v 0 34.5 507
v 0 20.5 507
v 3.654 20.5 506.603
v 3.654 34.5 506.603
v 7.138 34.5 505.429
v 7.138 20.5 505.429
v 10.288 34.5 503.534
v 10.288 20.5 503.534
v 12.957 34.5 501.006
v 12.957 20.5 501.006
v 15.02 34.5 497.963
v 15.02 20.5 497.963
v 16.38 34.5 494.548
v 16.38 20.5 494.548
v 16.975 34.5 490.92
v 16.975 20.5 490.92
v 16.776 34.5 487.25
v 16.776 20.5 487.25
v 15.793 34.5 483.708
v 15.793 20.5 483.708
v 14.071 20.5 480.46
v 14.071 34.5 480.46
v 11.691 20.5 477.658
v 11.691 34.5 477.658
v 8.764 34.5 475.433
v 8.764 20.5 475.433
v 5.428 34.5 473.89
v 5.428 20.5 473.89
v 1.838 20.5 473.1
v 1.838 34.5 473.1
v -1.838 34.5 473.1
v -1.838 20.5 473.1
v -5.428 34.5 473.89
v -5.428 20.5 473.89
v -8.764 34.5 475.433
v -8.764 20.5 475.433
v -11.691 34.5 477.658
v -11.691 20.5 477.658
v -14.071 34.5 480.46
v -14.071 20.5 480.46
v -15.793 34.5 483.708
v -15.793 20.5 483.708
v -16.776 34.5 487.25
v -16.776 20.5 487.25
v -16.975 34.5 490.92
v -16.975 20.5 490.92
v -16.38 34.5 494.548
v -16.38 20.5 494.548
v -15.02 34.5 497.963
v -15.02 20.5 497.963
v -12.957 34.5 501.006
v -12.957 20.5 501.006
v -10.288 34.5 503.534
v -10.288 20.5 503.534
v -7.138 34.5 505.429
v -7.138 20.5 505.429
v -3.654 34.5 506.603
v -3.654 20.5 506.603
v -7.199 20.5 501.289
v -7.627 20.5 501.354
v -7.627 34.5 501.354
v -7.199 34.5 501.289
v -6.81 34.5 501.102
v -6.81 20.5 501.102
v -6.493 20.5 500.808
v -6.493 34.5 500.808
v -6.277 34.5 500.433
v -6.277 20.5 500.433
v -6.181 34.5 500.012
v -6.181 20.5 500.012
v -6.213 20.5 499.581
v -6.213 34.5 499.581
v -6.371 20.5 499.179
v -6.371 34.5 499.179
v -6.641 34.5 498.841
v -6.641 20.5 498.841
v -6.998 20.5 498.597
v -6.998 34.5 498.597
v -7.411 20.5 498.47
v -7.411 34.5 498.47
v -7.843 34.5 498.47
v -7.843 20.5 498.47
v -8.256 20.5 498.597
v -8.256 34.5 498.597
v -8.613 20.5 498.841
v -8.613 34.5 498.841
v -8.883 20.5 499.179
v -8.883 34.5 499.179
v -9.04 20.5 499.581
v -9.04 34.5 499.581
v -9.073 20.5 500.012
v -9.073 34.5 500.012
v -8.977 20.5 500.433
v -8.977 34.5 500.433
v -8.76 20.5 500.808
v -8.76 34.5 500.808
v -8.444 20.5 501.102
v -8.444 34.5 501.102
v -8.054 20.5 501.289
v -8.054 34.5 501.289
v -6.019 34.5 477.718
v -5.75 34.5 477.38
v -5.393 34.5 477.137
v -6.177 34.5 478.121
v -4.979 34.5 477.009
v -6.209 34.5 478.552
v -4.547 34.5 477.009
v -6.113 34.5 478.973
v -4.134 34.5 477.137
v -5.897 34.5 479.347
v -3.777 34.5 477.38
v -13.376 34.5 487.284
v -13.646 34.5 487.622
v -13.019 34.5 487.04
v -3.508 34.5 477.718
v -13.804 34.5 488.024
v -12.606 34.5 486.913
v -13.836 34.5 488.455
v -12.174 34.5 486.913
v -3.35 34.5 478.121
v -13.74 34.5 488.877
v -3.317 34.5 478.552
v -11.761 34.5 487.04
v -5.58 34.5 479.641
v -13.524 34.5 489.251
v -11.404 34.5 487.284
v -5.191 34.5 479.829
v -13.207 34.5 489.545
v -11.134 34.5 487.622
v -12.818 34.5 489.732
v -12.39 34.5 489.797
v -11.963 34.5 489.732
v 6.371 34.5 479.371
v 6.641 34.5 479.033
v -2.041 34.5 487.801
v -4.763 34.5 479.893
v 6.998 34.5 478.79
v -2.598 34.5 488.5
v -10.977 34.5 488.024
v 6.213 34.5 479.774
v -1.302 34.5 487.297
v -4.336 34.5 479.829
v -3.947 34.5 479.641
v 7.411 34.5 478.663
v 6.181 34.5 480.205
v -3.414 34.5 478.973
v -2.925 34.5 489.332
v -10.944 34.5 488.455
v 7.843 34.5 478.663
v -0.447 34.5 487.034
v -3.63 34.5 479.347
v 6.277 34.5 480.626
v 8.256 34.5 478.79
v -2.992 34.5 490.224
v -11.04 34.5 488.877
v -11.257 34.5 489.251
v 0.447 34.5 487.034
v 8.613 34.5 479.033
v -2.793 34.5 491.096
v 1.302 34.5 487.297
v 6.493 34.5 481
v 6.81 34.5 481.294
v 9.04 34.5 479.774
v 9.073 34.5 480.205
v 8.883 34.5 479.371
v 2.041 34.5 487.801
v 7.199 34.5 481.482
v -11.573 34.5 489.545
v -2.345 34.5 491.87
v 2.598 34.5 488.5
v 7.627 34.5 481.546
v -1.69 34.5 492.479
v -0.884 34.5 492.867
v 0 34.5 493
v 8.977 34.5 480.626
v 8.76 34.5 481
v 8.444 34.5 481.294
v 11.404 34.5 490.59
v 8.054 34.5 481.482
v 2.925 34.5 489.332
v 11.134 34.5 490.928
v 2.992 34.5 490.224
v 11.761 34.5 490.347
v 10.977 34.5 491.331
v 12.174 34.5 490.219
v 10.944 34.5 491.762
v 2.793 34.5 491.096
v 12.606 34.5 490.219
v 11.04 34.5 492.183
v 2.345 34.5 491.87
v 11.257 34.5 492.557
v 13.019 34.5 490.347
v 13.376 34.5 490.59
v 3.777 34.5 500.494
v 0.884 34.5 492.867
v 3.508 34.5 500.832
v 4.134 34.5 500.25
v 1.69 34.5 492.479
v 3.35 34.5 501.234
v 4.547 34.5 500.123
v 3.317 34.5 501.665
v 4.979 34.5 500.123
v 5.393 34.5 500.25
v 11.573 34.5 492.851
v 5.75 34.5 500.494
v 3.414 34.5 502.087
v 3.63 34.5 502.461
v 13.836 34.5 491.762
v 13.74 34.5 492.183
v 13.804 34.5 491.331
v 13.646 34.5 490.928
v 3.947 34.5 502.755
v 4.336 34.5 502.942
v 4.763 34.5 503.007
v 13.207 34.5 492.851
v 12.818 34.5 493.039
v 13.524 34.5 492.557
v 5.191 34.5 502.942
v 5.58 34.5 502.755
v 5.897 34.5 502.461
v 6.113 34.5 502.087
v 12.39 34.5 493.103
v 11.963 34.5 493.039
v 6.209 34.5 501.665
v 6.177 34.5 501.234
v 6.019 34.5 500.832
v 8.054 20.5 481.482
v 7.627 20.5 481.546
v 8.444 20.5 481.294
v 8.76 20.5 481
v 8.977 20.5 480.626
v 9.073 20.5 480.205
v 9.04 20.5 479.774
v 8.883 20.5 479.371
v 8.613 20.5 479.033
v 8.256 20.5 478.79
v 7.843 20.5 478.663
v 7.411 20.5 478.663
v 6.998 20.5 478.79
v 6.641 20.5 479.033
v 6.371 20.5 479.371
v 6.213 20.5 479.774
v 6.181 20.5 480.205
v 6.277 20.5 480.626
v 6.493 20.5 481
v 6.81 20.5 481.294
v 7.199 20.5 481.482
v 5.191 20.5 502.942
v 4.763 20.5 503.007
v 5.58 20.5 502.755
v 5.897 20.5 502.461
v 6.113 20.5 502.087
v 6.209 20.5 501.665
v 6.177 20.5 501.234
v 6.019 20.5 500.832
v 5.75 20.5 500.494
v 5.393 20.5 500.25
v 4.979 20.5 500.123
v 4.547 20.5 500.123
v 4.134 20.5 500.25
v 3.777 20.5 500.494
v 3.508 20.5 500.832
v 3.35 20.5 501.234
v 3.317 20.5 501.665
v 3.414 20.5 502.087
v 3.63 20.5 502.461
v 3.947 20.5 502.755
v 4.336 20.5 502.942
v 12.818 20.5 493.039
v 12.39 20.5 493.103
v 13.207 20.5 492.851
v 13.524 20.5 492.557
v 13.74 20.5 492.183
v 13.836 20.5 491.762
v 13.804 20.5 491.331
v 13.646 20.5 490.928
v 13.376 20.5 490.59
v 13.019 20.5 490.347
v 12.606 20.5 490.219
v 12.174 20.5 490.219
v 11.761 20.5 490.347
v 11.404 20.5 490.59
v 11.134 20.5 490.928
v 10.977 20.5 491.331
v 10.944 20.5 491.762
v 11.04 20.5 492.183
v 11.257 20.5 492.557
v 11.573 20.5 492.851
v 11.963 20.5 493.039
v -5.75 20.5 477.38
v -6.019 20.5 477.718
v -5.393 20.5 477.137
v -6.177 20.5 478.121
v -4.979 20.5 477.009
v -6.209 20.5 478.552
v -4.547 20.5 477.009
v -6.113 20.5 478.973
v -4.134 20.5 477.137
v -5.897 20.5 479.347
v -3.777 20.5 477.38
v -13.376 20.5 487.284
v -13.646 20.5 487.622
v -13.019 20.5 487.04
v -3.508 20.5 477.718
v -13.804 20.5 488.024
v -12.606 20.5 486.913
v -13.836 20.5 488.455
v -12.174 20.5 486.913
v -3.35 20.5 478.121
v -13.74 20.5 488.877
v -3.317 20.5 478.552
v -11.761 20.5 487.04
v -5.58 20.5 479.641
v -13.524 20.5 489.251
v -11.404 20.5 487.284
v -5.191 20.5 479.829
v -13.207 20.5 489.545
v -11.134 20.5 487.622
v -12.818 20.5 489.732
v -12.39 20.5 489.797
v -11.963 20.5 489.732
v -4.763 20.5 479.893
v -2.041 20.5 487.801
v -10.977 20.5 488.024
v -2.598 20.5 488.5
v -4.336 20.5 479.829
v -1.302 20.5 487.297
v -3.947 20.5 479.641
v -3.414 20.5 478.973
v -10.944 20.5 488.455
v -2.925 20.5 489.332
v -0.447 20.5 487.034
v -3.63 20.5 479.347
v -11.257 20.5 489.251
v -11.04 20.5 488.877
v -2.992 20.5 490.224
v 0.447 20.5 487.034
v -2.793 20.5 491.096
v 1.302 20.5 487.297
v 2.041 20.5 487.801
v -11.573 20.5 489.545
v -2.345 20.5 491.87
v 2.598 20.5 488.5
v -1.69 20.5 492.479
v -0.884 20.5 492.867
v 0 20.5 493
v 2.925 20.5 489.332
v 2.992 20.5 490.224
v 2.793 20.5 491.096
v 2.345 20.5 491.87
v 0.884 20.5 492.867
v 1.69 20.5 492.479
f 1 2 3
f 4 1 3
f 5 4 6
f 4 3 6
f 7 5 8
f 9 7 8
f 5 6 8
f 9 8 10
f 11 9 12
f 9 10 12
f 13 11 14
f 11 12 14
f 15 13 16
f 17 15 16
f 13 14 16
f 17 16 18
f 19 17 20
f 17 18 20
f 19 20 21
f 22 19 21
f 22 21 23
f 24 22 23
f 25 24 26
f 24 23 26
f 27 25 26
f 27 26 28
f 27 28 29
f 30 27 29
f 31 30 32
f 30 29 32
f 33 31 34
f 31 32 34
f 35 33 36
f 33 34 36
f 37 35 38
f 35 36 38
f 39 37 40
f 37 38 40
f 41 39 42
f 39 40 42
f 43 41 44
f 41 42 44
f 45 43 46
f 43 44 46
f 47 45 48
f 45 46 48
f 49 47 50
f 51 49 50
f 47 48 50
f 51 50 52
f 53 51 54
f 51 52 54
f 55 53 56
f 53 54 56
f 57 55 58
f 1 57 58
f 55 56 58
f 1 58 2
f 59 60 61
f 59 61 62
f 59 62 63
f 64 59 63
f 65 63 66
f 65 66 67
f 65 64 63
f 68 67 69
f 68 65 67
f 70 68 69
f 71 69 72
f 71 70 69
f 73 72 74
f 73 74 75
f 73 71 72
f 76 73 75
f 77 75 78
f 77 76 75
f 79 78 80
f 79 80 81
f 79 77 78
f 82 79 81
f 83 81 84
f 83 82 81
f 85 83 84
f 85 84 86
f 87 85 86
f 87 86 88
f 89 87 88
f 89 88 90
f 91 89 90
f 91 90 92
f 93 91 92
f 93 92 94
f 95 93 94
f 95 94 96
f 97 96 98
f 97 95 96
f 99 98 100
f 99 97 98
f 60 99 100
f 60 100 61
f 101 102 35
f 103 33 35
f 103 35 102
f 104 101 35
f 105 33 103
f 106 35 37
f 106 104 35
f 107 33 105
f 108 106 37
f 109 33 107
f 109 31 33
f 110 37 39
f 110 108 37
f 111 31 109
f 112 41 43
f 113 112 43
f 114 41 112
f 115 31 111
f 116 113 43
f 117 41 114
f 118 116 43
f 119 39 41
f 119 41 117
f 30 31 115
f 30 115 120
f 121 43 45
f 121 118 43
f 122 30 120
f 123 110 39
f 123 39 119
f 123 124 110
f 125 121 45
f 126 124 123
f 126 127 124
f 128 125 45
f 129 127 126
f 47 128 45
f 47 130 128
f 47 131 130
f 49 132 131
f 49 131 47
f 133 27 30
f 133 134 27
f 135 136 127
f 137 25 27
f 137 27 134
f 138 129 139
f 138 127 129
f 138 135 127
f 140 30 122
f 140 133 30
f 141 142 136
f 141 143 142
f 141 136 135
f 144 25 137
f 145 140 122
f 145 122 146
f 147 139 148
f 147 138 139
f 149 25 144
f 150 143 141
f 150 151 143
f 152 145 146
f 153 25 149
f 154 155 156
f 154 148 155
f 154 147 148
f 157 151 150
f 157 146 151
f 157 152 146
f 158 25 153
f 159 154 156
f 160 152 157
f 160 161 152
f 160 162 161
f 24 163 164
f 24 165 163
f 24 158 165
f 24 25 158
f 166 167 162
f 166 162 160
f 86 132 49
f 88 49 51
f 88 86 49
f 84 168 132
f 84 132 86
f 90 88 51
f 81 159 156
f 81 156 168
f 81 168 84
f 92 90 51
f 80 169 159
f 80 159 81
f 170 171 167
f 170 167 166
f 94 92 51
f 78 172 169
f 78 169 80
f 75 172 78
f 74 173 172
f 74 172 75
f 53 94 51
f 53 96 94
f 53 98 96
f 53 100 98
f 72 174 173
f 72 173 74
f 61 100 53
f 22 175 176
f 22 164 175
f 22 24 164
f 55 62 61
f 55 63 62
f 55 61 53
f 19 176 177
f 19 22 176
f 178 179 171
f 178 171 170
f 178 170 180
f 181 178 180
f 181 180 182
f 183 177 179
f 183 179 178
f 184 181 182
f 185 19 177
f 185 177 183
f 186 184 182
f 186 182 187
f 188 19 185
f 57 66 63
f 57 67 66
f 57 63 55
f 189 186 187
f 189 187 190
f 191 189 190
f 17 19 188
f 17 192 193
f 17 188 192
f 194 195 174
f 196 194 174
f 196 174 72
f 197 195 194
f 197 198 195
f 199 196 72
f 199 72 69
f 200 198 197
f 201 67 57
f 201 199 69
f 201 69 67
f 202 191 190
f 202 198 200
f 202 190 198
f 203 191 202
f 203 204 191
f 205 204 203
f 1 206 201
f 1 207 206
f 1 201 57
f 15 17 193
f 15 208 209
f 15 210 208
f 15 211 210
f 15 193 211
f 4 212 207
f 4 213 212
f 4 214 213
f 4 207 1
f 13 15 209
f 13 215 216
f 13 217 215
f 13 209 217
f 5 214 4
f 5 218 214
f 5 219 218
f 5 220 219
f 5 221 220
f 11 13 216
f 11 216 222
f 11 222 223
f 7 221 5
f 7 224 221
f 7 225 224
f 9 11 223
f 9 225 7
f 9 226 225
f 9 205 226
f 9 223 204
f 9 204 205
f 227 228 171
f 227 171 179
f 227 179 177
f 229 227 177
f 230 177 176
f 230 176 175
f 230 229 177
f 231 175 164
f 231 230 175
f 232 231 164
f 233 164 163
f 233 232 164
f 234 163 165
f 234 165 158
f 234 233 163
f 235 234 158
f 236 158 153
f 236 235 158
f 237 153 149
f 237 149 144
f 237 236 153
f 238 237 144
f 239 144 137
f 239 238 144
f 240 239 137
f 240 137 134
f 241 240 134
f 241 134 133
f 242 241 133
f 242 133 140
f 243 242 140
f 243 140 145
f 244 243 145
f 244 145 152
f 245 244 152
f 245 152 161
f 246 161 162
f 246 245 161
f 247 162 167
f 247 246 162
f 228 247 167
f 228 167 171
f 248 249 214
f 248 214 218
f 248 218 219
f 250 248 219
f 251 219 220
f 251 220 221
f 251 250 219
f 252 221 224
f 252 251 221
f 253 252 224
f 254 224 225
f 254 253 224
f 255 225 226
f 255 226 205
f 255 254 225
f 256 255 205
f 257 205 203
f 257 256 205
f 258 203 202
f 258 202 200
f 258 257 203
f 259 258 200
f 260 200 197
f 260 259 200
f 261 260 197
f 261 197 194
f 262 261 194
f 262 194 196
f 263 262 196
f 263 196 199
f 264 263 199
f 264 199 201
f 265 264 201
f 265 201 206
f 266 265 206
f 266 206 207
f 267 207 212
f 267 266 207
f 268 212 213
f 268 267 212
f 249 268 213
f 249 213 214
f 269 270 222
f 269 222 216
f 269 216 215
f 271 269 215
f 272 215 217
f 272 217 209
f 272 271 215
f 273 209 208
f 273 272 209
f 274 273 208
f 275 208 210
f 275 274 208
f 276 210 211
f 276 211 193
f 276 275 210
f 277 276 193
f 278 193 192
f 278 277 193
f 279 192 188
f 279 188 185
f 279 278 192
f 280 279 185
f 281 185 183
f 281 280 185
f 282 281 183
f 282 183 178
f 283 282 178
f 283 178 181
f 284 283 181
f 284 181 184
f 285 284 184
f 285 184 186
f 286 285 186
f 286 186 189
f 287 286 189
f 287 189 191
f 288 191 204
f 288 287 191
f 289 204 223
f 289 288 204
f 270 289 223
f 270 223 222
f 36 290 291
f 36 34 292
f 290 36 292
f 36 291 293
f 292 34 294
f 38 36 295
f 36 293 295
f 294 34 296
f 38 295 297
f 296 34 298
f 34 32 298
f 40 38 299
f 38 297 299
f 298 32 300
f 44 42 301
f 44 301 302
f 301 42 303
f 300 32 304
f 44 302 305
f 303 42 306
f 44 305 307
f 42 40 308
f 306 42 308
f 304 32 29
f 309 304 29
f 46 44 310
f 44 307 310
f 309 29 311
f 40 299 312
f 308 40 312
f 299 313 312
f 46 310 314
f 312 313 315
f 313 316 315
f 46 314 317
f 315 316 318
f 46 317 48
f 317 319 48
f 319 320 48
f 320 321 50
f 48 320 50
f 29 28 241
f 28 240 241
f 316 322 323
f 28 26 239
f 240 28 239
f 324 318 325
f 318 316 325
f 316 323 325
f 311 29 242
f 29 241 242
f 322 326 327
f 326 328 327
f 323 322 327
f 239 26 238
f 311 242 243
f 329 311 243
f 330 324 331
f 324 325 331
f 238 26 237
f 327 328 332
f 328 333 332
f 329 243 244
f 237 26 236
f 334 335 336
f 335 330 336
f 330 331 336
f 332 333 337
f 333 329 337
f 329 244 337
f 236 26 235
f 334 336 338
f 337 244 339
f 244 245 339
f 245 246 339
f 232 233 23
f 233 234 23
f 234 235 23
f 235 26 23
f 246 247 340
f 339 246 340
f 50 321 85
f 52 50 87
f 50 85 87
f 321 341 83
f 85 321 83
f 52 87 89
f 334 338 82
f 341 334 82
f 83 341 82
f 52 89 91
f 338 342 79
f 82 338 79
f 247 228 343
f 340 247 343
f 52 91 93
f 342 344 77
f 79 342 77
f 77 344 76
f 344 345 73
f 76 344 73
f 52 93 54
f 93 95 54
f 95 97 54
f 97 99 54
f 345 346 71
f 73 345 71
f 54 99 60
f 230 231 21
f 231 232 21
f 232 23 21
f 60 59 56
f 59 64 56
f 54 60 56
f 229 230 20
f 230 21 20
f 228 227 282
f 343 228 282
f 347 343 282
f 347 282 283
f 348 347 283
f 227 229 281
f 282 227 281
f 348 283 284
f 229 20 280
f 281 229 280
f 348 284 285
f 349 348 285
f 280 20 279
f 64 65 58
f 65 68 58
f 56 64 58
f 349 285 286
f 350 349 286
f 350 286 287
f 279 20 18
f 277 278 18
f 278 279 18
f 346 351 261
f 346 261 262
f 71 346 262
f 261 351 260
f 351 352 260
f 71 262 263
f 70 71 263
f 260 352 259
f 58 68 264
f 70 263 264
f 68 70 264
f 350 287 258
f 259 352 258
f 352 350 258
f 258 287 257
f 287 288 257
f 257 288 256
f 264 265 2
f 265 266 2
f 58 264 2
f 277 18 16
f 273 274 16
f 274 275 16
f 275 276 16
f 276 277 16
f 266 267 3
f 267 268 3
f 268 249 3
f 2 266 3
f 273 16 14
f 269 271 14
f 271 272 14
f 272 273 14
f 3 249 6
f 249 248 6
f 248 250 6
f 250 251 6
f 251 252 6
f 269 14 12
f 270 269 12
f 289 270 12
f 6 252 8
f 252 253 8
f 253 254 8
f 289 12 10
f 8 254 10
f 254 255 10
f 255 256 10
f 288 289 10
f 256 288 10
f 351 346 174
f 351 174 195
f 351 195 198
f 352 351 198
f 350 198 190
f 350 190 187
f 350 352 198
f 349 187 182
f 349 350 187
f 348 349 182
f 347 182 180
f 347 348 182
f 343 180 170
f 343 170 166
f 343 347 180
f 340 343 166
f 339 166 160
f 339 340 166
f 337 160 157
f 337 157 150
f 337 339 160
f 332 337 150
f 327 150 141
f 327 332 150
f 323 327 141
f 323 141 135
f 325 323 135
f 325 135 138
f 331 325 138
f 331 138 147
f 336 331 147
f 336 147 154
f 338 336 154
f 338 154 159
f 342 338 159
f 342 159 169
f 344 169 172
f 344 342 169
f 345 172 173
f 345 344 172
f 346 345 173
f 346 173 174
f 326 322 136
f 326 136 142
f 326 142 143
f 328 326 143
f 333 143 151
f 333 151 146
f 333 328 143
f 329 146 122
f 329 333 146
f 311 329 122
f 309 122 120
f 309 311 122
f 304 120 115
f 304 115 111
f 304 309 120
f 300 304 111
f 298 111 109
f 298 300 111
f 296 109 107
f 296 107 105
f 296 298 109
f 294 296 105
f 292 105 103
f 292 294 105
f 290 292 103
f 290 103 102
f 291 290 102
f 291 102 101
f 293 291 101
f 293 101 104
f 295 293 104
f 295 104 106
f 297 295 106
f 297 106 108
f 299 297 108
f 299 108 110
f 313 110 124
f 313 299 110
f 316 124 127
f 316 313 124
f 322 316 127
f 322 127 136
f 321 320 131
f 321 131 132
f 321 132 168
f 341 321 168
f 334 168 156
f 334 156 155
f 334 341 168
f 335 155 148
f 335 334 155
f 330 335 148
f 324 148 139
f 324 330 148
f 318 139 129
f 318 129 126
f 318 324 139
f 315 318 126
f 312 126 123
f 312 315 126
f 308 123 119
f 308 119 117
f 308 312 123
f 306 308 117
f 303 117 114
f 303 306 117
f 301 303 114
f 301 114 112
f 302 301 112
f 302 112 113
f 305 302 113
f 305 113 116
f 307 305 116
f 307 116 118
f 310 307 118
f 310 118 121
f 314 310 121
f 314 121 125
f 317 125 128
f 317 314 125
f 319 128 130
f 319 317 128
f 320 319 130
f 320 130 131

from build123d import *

# Parameters (mm, degrees)
CUBO_START          = 20.5
SK_CUBO_R           = 17
CUBO_DEPTH          = 14
PASANTES_M2_5_START = 20.5
SK_PASANTES_M2_5_R  = 1.45
PASANTES_M2_5_DEPTH = 14
CENTRO_START        = 20.5
SK_CENTRO_R         = 3
CENTRO_DEPTH        = 14


with BuildPart() as part:
    # Sk_Cubo → Cubo (new body)
    with BuildSketch(Plane(origin=(0, 0, 0), x_dir=(1, 0, 0), z_dir=(0, 1, 0)).offset(CUBO_START)):
        with Locations(Location((0, -490, 0), (0, 0, 270))):
            Circle(SK_CUBO_R)
    extrude(amount=CUBO_DEPTH)

    # Sk_Pasantes_M2-5 → Pasantes_M2-5 (cut)
    with BuildSketch(Plane(origin=(0, 0, 0), x_dir=(1, 0, 0), z_dir=(0, 1, 0)).offset(PASANTES_M2_5_START)):
        with Locations(Location((12.390194253, -491.653204878, 0), (0, 0, 270))):
            Circle(SK_PASANTES_M2_5_R)
        with Locations(Location((4.763379704, -501.55682542, 0), (0, 0, 270))):
            Circle(SK_PASANTES_M2_5_R)
        with Locations(Location((-7.626814549, -499.903620542, 0), (0, 0, 270))):
            Circle(SK_PASANTES_M2_5_R)
        with Locations(Location((-12.390194253, -488.346795122, 0), (0, 0, 270))):
            Circle(SK_PASANTES_M2_5_R)
        with Locations(Location((-4.763379704, -478.44317458, 0), (0, 0, 270))):
            Circle(SK_PASANTES_M2_5_R)
        with Locations(Location((7.626814549, -480.096379458, 0), (0, 0, 270))):
            Circle(SK_PASANTES_M2_5_R)
    extrude(amount=PASANTES_M2_5_DEPTH, mode=Mode.SUBTRACT)

    # Sk_Centro → Centro (cut)
    with BuildSketch(Plane(origin=(0, 0, 0), x_dir=(1, 0, 0), z_dir=(0, 1, 0)).offset(CENTRO_START)):
        with Locations(Location((0, -490, 0), (0, 0, 270))):
            Circle(SK_CENTRO_R)
    extrude(amount=CENTRO_DEPTH, mode=Mode.SUBTRACT)


solid = part.part
